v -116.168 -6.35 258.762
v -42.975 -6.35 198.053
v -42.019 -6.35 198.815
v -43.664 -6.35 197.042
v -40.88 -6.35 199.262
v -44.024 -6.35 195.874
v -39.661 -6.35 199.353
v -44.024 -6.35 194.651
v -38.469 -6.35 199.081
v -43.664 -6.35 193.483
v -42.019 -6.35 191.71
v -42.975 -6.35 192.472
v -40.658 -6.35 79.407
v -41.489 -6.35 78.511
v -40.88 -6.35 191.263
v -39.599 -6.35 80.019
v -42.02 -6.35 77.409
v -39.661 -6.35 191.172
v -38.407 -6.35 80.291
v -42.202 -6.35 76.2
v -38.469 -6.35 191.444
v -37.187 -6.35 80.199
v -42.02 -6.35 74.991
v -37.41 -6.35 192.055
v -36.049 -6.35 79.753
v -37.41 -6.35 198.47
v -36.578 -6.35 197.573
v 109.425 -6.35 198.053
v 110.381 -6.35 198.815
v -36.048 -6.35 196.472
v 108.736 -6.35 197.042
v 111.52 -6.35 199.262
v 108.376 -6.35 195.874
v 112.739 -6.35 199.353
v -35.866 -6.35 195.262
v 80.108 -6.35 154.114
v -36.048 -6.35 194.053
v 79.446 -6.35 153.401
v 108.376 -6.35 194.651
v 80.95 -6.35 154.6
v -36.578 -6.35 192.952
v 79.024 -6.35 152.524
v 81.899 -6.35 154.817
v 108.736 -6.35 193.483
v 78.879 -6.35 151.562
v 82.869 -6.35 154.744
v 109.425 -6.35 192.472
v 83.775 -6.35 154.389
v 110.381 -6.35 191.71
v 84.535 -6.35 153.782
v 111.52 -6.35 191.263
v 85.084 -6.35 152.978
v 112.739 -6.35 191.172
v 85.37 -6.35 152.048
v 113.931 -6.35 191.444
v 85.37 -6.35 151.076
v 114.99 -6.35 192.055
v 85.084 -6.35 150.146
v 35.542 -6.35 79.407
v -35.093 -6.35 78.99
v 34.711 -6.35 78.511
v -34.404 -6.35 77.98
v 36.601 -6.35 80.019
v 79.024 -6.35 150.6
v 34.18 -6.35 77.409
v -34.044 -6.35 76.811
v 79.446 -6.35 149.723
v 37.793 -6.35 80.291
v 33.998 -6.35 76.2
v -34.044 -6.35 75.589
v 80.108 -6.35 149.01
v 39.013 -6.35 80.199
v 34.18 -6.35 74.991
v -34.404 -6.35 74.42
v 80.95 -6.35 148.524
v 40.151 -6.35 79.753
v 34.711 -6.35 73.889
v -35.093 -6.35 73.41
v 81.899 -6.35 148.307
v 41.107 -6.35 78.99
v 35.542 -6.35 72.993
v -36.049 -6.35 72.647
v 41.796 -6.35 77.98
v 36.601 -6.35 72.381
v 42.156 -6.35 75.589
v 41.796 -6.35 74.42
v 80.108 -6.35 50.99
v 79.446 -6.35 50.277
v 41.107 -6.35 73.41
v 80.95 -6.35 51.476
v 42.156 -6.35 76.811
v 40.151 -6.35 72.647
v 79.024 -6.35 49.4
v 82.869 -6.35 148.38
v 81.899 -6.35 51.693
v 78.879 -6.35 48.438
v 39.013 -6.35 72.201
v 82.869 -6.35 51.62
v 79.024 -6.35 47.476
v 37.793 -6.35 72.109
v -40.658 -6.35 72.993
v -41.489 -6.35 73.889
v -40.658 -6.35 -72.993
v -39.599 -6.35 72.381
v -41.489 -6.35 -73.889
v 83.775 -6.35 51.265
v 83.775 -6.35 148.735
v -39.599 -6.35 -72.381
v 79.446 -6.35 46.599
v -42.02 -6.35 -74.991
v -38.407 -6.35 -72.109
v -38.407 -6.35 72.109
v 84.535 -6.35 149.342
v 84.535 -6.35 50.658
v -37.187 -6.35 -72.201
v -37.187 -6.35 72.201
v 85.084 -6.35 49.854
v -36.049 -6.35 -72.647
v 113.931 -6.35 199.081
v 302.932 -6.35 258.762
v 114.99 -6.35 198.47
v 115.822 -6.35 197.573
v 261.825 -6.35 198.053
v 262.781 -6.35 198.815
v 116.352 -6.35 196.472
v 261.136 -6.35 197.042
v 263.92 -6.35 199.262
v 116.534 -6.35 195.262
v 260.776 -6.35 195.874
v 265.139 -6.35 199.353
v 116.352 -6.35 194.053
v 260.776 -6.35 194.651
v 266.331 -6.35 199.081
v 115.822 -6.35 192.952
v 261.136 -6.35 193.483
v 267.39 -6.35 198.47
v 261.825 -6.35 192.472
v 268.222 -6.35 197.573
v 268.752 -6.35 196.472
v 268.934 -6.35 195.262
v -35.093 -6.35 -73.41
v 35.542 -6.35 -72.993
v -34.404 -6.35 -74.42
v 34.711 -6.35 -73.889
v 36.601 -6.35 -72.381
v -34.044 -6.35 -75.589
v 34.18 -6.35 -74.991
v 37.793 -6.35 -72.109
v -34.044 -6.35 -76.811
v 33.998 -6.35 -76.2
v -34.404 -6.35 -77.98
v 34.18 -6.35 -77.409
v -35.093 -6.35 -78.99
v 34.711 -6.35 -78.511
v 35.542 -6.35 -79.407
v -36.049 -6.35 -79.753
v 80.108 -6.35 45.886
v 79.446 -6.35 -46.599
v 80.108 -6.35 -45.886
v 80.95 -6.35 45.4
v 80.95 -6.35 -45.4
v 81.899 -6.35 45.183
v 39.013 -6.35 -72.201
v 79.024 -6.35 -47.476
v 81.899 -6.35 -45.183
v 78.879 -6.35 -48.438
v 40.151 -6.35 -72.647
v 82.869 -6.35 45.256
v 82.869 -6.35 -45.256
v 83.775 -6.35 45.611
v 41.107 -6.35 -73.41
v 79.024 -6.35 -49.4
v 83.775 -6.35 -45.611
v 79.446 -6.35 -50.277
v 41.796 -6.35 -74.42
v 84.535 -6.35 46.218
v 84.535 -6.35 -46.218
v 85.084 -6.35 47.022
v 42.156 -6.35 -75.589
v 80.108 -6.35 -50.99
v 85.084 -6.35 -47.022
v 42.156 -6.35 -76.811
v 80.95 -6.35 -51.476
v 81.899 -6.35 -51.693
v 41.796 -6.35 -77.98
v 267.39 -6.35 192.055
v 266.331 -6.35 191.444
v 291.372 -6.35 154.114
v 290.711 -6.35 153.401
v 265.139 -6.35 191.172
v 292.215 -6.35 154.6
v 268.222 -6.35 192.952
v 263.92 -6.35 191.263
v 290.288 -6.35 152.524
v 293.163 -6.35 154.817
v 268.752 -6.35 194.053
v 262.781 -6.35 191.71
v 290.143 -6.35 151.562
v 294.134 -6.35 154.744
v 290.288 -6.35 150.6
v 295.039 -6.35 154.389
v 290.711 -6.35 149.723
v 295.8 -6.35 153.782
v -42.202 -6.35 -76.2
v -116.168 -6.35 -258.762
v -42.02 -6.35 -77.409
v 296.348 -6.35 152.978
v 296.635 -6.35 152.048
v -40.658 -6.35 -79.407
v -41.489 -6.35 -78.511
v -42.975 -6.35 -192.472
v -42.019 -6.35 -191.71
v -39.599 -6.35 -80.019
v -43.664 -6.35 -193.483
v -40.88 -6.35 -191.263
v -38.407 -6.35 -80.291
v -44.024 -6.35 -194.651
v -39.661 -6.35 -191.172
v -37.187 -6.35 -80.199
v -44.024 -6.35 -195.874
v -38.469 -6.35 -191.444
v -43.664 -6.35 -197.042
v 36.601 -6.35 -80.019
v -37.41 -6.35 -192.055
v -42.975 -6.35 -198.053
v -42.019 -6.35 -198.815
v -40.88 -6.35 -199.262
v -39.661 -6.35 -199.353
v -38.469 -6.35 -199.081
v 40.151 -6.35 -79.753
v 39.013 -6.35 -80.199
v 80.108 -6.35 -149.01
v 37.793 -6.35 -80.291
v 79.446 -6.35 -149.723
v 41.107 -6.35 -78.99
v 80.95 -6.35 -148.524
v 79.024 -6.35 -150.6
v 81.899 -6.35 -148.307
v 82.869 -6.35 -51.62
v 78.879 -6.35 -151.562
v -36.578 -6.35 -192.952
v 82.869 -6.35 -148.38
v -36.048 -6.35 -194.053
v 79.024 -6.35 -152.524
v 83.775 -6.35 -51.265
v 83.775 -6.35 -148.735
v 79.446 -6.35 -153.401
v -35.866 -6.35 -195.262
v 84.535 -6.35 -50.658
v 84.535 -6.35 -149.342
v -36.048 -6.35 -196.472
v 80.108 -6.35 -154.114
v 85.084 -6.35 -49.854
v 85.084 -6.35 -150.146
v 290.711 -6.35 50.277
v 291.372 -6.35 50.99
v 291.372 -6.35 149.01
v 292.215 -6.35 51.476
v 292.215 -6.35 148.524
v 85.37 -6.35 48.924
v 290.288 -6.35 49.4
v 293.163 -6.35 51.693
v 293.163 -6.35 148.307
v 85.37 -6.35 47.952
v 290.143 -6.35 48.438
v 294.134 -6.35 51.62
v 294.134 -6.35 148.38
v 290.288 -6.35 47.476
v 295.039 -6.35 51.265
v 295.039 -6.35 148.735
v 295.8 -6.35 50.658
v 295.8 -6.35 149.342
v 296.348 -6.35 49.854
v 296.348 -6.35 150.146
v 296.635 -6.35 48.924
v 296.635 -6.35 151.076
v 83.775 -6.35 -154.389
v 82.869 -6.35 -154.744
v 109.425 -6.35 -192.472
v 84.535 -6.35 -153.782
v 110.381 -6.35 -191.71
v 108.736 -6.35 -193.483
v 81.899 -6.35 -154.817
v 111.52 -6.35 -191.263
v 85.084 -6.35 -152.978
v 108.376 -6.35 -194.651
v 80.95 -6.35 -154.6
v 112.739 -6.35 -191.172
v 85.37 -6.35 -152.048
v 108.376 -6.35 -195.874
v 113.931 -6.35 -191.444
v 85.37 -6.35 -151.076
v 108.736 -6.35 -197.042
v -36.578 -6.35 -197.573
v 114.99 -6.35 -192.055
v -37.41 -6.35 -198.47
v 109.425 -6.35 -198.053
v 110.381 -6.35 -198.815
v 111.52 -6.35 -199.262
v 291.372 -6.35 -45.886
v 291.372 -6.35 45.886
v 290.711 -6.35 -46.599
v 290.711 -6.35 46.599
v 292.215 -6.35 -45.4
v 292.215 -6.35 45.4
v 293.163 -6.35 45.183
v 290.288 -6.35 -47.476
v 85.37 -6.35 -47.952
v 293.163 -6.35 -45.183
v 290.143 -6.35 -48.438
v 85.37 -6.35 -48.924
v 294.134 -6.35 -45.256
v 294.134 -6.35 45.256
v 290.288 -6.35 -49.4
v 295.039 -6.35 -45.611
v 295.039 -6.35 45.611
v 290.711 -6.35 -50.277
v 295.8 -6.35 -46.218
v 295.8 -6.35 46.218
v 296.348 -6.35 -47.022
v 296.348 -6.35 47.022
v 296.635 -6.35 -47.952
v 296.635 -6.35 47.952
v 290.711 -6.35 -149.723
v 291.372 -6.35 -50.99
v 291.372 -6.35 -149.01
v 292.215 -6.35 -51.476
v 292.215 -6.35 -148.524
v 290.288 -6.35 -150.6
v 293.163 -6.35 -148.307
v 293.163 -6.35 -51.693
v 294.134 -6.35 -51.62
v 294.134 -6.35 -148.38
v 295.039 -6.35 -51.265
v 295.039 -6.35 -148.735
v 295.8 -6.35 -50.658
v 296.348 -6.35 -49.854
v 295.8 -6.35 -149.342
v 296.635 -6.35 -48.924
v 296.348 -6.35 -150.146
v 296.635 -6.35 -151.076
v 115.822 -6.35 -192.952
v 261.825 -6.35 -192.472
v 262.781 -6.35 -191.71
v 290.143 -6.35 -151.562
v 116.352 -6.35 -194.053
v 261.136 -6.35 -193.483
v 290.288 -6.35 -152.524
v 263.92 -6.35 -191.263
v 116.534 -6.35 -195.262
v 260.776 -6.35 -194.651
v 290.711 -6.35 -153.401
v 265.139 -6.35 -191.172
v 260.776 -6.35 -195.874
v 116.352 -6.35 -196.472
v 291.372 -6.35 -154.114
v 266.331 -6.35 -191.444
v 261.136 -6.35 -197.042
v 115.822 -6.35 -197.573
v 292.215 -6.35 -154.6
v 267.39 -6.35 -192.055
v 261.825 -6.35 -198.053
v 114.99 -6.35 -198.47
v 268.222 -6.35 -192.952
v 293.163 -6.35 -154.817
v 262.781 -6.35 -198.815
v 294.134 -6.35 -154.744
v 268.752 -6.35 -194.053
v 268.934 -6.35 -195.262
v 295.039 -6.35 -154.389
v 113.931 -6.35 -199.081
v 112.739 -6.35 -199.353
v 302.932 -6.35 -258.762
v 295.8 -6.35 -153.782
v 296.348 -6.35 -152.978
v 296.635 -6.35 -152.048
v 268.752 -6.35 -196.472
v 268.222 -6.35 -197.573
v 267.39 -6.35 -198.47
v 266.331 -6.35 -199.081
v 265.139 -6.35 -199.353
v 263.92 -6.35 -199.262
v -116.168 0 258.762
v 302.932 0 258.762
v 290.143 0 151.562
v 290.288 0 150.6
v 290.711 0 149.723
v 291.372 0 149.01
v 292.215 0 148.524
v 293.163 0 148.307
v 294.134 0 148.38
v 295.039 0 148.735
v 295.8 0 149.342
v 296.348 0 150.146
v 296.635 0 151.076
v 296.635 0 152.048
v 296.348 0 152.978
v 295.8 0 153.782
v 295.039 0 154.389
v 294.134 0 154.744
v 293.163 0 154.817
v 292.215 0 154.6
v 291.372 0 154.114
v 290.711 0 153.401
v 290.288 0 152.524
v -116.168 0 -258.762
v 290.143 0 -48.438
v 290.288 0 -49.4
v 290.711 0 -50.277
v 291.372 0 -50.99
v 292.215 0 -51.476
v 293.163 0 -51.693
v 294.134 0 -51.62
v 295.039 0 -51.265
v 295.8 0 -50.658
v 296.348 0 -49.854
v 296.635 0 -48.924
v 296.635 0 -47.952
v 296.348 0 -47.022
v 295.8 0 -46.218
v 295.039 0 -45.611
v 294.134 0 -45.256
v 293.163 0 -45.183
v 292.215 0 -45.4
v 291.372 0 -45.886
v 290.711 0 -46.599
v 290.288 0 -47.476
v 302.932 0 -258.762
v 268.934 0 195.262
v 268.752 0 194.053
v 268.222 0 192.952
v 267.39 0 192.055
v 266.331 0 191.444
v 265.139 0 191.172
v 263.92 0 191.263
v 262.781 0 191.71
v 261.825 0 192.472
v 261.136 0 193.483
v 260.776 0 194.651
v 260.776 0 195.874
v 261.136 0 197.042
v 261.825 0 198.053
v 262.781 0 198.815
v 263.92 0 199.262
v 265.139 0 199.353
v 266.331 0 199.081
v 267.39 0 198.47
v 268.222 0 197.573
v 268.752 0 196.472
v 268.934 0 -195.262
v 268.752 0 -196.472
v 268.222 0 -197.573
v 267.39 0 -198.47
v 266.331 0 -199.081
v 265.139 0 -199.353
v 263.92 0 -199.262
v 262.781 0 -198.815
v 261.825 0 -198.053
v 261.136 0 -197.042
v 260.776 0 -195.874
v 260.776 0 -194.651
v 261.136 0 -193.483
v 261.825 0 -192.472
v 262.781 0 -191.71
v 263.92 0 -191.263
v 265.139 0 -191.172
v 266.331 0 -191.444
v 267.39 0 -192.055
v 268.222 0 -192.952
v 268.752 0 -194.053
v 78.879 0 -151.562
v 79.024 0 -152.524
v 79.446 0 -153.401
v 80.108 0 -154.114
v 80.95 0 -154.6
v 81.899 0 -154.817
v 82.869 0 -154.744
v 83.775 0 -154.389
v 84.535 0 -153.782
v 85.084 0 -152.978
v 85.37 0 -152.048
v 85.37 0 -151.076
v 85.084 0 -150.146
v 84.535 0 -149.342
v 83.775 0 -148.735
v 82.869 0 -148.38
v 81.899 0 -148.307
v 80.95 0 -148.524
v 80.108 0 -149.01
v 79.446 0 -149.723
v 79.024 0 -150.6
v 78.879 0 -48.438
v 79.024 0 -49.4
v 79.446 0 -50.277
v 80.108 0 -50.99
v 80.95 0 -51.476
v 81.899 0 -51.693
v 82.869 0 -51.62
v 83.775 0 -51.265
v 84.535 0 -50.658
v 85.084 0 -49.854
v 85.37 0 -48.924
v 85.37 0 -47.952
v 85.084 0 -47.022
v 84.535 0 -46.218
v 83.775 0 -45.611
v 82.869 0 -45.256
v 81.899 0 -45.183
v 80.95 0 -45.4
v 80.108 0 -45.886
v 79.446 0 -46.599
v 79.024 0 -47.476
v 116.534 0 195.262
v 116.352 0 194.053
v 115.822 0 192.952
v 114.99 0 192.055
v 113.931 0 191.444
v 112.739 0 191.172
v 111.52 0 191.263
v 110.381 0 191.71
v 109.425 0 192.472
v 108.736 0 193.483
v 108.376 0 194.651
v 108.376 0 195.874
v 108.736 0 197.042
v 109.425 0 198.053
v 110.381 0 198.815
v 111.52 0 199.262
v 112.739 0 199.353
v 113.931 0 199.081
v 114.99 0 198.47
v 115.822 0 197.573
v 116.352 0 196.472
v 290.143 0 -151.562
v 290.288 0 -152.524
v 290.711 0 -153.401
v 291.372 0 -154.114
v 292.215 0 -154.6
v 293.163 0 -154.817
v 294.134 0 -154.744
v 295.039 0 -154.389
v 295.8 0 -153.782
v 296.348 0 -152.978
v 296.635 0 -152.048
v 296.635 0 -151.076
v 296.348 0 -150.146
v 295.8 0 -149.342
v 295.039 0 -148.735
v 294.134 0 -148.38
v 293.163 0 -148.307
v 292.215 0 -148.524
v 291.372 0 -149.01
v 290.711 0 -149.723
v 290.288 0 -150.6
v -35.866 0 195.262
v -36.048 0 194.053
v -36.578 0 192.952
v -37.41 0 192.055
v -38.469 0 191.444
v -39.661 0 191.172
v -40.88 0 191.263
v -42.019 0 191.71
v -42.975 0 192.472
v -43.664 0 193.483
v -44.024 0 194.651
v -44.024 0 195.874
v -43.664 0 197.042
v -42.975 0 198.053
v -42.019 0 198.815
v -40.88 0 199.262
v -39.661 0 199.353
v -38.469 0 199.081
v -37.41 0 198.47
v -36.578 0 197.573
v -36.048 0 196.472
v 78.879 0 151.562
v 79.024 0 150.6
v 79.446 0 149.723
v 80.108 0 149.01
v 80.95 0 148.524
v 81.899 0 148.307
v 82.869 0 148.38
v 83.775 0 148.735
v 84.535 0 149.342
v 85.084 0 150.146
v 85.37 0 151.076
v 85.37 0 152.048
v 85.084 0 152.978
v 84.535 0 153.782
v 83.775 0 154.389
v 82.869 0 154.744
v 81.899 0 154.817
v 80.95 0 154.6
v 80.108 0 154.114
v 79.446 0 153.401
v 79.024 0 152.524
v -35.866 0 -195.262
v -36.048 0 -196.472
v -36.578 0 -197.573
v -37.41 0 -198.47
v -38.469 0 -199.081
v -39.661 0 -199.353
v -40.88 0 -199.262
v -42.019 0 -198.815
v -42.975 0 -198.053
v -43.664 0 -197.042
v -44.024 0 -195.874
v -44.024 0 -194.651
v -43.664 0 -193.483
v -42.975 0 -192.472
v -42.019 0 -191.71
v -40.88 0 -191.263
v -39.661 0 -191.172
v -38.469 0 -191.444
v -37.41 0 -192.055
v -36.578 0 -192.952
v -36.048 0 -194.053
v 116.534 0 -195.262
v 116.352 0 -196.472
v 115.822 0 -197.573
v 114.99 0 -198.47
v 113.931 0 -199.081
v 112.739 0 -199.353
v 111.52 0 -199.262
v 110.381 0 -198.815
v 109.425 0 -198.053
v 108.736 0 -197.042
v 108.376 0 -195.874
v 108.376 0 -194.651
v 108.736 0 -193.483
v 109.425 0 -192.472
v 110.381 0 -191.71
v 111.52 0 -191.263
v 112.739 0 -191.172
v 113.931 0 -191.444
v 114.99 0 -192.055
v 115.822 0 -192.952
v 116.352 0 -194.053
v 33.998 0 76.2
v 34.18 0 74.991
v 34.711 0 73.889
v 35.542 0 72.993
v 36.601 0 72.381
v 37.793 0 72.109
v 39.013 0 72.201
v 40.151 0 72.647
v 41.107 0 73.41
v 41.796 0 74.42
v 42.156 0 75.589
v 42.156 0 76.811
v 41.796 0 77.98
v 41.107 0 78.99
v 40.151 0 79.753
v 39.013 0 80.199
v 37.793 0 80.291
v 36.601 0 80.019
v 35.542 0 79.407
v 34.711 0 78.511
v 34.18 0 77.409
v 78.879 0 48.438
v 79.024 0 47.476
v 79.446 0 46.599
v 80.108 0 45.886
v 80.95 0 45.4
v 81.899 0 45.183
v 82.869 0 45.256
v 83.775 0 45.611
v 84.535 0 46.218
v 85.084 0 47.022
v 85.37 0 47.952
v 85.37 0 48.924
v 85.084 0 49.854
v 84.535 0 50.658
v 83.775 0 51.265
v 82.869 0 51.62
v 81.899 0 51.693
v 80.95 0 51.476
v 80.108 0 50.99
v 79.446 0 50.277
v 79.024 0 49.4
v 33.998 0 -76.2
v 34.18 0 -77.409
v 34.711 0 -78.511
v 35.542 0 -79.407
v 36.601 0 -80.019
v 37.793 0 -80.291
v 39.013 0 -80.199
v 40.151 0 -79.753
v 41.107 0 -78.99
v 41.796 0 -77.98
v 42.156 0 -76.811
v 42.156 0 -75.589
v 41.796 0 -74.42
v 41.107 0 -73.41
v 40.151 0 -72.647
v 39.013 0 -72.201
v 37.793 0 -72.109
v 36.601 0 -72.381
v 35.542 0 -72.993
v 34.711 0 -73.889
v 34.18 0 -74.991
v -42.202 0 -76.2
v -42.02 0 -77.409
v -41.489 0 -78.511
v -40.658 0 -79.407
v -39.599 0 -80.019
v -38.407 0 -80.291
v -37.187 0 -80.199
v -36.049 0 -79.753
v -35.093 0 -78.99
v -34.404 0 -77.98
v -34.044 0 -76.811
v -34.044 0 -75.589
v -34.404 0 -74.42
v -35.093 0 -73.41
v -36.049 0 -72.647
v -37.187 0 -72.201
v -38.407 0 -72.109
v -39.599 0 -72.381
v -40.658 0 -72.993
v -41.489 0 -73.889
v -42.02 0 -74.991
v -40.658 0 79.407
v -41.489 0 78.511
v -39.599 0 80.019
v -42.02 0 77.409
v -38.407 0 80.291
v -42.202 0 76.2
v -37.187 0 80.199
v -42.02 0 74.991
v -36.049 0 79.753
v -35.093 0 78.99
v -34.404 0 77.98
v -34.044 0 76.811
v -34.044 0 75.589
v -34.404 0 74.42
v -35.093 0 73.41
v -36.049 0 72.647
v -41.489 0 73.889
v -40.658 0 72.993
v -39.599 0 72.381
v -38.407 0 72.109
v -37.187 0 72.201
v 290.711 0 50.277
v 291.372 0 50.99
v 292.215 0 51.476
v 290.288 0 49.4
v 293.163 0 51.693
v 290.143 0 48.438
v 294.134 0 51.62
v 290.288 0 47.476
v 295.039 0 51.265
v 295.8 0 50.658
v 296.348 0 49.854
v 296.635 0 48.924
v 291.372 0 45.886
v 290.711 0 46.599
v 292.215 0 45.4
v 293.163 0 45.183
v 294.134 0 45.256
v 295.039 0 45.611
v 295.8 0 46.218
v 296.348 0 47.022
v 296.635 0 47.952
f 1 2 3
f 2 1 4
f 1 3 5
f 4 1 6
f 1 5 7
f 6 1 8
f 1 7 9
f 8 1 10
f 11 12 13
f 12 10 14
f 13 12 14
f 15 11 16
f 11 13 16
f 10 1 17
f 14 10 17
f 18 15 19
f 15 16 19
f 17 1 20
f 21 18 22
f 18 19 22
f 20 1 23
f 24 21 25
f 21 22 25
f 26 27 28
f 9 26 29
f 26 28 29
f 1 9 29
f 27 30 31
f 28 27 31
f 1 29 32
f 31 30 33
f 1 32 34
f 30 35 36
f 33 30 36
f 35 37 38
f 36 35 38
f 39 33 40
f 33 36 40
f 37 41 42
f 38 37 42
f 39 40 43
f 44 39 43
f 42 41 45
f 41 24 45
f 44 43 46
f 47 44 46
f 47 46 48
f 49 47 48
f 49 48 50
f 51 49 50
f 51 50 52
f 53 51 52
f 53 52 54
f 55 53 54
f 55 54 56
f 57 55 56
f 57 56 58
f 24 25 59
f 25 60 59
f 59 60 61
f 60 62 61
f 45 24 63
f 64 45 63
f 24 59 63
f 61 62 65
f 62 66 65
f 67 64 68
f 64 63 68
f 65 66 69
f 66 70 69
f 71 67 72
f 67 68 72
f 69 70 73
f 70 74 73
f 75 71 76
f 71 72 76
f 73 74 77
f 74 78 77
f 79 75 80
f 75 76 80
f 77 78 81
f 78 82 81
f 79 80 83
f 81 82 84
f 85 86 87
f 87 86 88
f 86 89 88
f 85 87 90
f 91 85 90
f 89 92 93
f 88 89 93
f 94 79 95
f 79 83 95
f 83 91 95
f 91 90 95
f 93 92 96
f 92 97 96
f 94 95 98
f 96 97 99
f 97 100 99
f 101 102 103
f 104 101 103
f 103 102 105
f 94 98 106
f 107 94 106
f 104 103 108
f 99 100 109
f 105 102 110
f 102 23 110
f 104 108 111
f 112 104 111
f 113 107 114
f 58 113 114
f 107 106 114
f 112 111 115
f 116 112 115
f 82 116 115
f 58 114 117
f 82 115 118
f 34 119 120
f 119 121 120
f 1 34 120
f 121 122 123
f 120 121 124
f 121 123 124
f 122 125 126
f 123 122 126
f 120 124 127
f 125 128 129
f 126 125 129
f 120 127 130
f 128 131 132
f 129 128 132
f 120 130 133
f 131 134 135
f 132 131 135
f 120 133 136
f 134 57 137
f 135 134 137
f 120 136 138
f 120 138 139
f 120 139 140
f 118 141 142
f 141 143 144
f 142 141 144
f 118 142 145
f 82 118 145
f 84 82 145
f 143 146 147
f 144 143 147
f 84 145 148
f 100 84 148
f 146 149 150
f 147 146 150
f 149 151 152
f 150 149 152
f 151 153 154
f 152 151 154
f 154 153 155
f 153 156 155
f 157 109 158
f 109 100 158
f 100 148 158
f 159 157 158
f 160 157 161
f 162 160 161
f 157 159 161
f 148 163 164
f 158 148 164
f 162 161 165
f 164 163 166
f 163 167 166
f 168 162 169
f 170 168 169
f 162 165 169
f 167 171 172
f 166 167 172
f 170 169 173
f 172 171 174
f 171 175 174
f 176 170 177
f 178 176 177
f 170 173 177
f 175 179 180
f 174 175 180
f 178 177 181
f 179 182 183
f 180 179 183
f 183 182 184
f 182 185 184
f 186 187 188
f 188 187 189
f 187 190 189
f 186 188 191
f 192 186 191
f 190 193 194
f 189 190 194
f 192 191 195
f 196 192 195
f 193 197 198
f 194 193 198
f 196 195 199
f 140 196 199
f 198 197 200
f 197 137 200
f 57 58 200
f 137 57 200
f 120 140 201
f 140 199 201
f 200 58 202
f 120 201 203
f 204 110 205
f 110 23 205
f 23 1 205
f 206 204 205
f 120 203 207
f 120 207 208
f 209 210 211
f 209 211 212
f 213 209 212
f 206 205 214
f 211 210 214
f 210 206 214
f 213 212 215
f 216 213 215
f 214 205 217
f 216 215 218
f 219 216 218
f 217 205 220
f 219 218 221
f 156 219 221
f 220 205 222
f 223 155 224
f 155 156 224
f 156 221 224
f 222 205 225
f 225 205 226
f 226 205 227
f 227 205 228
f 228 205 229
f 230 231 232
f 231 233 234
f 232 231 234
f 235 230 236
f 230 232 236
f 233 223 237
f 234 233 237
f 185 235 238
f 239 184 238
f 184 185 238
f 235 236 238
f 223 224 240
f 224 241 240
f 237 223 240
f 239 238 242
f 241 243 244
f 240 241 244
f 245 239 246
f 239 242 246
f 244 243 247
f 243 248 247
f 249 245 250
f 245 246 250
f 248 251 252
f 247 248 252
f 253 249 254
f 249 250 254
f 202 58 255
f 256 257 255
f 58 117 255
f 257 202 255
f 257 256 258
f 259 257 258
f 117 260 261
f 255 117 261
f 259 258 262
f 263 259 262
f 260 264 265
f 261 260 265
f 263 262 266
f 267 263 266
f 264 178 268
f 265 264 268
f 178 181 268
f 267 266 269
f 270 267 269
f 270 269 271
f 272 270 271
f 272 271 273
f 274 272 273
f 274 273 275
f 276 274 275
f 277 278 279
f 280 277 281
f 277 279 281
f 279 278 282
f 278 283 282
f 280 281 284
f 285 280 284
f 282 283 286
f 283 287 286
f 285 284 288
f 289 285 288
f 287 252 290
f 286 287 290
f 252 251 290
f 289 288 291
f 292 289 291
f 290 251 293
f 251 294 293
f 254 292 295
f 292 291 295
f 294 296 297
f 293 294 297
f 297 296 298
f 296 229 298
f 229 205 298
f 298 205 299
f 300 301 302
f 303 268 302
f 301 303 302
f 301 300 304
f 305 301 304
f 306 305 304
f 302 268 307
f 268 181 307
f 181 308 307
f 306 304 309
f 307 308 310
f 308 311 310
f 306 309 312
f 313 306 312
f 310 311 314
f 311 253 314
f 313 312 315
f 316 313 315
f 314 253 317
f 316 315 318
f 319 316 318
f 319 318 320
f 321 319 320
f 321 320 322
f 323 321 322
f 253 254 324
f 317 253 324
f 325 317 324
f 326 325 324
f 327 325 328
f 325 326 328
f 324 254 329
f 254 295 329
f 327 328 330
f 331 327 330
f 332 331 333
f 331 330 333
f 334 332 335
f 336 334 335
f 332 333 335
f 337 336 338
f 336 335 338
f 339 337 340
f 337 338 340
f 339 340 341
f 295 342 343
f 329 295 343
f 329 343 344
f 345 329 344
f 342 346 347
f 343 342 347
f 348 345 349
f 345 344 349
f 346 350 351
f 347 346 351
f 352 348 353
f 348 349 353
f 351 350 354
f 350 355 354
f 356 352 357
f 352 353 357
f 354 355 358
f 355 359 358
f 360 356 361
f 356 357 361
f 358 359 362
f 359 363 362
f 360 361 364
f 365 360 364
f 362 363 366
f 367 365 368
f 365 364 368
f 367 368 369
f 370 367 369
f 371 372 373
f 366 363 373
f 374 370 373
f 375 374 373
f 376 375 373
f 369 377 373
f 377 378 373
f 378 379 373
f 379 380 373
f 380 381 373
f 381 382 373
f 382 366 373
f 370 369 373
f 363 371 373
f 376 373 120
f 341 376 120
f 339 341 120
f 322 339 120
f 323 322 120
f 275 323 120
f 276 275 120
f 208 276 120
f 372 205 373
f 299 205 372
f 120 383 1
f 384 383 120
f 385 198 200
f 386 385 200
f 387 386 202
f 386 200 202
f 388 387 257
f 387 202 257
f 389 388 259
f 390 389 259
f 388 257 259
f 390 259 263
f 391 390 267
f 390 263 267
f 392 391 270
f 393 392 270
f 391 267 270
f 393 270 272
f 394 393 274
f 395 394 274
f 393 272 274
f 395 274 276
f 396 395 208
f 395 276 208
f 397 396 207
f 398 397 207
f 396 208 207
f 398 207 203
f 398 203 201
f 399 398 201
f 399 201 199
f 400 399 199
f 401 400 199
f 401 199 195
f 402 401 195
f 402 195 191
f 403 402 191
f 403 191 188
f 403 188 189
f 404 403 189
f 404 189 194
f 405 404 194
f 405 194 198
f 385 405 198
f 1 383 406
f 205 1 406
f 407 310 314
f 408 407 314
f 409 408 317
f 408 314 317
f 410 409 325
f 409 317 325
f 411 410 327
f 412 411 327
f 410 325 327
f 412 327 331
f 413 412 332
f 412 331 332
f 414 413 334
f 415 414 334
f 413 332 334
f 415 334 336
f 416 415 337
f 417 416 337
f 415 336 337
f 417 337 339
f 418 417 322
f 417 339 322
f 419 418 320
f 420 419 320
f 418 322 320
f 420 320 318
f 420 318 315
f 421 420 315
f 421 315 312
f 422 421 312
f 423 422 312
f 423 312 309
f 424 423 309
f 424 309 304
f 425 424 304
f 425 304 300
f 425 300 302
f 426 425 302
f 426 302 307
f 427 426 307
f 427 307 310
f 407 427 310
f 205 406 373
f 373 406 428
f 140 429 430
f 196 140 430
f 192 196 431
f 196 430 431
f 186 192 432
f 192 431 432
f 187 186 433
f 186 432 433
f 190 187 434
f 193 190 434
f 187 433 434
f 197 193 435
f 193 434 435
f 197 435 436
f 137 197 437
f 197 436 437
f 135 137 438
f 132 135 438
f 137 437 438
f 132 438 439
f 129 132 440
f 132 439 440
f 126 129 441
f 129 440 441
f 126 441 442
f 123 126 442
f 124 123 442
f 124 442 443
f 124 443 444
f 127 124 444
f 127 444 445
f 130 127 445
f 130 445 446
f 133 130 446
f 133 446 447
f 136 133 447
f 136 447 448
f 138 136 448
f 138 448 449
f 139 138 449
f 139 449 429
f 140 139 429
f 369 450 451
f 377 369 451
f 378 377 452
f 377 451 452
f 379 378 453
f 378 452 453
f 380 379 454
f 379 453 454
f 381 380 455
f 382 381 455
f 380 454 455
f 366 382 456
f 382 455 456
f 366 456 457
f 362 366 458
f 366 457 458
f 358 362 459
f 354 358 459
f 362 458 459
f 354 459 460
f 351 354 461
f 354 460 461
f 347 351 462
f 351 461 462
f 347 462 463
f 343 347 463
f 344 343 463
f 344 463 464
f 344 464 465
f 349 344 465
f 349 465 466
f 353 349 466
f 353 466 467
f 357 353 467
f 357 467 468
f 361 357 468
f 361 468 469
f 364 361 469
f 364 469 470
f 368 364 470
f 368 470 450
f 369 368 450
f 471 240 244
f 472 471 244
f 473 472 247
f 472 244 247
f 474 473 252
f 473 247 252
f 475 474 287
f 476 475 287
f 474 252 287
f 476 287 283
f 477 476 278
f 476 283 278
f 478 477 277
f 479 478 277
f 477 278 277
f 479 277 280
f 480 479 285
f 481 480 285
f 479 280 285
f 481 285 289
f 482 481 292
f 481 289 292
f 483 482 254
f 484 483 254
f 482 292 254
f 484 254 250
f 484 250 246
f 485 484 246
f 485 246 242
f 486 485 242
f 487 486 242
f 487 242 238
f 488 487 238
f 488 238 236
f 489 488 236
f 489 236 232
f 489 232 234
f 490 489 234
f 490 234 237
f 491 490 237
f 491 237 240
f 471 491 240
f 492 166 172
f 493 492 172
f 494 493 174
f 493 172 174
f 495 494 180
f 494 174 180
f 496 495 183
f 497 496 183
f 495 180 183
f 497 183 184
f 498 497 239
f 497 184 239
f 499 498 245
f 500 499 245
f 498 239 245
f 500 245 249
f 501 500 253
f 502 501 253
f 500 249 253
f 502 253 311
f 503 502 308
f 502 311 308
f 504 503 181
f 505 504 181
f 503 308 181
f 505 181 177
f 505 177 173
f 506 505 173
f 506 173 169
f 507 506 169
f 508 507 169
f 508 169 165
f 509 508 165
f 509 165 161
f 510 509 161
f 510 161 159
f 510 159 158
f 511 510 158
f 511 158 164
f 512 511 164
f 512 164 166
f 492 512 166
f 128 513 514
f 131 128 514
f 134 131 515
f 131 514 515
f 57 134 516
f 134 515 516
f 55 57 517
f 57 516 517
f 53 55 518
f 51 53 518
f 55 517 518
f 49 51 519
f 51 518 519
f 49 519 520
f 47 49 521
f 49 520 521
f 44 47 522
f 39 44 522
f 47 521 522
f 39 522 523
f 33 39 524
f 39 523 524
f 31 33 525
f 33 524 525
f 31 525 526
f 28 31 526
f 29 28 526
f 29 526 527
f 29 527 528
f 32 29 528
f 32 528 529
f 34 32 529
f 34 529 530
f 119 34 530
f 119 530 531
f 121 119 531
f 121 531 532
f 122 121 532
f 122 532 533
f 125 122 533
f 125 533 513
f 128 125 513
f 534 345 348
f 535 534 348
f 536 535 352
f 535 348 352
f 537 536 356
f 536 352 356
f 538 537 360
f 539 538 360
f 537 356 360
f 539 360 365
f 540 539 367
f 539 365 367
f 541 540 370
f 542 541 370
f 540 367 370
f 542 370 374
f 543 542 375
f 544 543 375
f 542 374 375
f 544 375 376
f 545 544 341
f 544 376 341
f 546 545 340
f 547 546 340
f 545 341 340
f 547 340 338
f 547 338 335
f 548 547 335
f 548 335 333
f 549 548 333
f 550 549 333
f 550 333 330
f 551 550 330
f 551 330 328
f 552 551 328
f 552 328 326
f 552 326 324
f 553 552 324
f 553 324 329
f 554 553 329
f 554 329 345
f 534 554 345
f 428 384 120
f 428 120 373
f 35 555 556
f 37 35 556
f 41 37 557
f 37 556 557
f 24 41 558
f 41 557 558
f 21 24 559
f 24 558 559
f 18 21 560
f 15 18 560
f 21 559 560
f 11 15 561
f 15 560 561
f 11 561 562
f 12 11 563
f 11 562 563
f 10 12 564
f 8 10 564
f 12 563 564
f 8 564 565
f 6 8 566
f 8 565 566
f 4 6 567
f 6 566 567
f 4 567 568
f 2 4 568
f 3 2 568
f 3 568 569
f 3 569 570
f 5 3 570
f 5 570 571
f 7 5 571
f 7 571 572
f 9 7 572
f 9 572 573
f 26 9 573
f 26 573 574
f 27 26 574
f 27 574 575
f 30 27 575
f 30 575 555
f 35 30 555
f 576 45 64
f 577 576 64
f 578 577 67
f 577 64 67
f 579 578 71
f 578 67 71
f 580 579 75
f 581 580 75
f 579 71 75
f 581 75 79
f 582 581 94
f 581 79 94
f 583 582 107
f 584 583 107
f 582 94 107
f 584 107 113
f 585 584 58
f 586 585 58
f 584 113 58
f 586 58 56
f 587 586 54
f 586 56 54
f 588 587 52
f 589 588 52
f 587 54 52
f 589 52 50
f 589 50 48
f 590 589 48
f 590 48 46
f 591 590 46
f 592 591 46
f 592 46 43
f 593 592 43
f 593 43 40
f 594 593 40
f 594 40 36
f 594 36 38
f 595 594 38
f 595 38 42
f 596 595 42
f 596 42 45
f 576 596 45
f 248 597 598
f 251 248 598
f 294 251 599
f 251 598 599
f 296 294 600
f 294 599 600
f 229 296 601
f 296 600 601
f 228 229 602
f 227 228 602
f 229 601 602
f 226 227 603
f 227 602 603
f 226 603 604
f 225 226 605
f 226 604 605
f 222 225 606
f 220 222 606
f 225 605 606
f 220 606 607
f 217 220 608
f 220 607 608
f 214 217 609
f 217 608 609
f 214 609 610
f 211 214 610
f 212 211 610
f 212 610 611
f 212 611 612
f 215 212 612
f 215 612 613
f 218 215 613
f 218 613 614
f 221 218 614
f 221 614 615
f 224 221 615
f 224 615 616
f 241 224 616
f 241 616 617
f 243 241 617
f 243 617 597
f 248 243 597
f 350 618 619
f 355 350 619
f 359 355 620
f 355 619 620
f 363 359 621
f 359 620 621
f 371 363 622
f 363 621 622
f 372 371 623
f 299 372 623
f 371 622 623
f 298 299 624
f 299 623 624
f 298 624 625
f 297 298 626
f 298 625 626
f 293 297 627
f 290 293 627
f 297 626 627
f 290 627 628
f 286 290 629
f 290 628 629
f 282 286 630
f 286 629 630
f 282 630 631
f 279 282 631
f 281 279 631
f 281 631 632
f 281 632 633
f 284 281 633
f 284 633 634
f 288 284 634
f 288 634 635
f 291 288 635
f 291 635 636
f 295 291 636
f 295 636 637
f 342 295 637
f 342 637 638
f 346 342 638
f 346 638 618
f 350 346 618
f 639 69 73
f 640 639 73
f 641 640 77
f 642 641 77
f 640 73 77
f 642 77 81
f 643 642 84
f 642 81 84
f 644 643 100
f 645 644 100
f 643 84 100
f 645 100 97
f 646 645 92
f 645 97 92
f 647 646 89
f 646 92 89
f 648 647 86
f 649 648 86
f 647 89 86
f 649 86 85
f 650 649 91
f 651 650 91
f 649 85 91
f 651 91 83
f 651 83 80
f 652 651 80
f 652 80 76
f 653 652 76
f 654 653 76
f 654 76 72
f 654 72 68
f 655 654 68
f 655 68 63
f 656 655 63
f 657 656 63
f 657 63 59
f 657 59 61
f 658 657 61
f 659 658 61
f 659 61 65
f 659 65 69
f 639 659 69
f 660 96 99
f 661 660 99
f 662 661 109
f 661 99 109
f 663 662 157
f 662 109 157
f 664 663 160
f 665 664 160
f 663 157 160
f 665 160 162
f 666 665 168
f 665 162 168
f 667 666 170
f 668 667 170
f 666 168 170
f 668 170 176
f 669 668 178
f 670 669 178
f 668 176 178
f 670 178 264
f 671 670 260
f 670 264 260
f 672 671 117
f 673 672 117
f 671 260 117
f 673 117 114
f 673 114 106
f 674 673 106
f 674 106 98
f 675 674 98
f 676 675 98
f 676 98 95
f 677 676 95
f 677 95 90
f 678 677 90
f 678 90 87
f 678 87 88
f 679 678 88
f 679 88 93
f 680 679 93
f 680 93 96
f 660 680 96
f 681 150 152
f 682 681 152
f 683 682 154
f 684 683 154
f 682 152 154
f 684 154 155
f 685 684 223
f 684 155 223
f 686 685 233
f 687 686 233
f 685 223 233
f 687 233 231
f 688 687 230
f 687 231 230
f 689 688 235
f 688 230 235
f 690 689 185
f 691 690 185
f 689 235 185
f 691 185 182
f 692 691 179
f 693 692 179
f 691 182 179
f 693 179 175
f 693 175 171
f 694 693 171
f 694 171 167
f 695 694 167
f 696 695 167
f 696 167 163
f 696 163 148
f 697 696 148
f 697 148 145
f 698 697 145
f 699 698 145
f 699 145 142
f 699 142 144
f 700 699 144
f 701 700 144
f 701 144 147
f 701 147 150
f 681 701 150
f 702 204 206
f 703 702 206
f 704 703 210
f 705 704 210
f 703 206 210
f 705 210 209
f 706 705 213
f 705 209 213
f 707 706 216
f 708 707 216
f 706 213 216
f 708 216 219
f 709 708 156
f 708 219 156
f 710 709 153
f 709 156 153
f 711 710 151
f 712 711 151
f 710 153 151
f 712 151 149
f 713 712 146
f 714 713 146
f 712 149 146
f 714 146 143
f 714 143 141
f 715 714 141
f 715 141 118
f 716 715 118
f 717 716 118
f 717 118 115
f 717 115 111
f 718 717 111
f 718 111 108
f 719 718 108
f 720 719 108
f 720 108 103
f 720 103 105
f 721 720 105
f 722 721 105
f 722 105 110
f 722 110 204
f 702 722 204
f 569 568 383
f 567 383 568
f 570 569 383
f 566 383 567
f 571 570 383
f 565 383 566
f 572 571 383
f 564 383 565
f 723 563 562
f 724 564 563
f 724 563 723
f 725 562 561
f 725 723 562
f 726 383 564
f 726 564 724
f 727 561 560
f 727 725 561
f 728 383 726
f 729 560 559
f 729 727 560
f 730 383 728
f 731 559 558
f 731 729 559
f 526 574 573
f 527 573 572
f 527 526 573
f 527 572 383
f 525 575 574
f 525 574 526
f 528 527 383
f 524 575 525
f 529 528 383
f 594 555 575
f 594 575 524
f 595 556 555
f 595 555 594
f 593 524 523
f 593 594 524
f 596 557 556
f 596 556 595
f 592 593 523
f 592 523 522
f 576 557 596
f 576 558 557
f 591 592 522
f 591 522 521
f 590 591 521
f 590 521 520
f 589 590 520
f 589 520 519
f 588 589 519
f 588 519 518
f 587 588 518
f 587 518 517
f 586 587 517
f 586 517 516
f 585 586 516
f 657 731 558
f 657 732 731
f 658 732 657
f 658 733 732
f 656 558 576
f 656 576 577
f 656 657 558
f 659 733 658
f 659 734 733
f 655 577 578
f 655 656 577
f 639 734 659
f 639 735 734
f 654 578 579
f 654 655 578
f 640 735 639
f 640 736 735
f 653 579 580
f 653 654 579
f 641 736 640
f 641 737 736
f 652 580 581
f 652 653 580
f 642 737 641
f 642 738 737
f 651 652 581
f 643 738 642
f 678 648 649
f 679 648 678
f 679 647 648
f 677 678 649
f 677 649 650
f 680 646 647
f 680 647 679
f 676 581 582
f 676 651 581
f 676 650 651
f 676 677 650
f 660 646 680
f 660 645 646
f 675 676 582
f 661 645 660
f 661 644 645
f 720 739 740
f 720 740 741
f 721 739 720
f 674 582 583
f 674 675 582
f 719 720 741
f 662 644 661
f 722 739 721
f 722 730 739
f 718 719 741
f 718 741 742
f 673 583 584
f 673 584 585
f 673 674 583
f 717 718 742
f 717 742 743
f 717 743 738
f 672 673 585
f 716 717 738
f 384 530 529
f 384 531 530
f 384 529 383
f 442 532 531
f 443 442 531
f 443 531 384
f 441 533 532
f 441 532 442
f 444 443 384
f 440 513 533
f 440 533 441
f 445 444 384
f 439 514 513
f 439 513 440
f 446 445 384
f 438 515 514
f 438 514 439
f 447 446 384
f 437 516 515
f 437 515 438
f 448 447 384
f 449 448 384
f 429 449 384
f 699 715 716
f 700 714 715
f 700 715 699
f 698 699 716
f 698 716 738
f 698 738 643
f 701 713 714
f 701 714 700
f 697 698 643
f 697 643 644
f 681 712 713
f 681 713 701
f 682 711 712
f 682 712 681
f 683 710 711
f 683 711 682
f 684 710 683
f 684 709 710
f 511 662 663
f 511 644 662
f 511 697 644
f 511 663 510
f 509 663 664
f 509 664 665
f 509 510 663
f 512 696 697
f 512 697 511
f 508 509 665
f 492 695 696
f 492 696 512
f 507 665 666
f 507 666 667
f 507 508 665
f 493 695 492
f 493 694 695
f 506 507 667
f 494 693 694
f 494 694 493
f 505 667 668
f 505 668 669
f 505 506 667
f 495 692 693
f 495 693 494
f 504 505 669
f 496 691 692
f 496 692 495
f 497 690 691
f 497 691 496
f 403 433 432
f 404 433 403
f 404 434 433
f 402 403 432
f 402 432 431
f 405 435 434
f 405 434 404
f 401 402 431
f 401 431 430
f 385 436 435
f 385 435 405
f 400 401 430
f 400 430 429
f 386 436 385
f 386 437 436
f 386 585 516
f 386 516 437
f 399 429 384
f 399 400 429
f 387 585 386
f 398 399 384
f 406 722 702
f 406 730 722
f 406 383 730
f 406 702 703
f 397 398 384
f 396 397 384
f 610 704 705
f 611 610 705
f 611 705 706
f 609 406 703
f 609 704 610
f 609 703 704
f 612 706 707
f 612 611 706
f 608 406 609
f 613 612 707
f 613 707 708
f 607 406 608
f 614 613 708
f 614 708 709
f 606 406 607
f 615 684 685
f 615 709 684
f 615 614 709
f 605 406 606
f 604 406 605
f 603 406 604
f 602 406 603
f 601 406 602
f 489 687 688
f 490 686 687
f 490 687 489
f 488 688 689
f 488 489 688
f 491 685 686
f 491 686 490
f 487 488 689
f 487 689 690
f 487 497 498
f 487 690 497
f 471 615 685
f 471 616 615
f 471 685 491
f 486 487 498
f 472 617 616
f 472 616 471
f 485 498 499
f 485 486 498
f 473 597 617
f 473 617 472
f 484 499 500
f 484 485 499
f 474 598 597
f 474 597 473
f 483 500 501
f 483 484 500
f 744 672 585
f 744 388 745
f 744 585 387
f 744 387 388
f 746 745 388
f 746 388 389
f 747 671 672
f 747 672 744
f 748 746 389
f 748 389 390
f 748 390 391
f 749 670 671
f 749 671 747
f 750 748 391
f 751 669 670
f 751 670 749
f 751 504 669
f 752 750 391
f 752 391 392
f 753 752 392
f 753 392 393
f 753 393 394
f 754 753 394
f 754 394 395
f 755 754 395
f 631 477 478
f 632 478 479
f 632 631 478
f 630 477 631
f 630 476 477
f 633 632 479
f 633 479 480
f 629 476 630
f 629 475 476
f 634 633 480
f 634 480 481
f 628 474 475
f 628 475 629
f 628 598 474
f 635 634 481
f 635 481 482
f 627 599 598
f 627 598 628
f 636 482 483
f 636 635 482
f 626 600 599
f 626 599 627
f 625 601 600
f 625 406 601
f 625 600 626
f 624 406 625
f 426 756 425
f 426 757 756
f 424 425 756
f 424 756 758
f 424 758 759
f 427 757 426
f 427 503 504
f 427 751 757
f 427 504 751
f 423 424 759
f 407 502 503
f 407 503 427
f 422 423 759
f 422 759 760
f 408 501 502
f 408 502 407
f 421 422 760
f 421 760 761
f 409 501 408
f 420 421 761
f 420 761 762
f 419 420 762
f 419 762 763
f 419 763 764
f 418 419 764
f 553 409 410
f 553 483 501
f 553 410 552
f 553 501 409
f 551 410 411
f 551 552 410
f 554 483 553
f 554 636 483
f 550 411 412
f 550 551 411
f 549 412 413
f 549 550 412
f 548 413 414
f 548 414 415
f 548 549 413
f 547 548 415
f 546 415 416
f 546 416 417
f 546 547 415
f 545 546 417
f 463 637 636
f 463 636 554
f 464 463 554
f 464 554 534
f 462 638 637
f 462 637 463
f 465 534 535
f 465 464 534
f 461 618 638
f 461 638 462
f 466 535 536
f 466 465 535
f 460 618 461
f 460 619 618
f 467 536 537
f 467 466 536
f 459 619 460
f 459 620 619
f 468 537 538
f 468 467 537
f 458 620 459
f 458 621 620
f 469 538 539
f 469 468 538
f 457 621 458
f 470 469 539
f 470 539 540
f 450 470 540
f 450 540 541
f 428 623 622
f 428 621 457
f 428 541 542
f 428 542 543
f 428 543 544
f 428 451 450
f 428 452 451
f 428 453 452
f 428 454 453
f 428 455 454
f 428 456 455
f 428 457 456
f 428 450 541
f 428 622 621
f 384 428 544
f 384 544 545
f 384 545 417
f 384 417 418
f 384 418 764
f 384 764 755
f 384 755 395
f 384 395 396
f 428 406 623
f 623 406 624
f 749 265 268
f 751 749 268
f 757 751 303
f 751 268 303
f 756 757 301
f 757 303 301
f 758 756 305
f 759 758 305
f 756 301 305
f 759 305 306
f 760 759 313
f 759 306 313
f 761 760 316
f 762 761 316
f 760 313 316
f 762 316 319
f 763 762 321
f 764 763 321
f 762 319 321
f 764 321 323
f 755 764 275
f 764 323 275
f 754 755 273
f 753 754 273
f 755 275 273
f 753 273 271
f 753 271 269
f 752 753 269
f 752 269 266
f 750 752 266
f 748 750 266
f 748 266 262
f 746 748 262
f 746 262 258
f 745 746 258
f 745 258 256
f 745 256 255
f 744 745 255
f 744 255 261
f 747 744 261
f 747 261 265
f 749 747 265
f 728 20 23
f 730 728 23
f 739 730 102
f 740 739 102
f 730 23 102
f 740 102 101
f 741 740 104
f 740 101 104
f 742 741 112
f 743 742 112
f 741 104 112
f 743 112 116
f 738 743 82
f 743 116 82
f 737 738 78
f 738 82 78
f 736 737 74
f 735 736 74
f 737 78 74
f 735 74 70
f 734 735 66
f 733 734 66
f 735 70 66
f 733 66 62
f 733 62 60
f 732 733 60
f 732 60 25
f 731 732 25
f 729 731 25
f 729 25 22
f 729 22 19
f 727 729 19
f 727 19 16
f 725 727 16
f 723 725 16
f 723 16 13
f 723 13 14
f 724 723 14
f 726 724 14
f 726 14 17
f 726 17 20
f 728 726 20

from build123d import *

# Parameters (mm, degrees)
SKETCH1_W                    = 419.1
SKETCH1_H                    = 517.525
BOSS_EXTRUDE1_DEPTH          = 6.35
F_0_257_DIAMETER_HOLE1_D     = 6.5278
F_0_257_DIAMETER_HOLE1_DEPTH = 6.35
P_0_323_DIAMETER_HOLE1_D     = 8.2042
CUT_EXTRUDE2_REACH           = 8.35
SKETCH9_R                    = 4.1021


with BuildPart() as part:
    # Sketch1 → Boss-Extrude1 (new body)
    with BuildSketch(Plane(origin=(0, 0, 0), x_dir=(1, 0, 0), z_dir=(0, 1, 0))):
        with Locations((93.382352941, 0)):
            Rectangle(SKETCH1_W, SKETCH1_H)
    extrude(amount=-BOSS_EXTRUDE1_DEPTH)

    # F (0.257) Diameter Hole1
    with Locations(Plane(origin=(0, 0, 0), x_dir=(1, 0, 0), z_dir=(0, 1, 0))):
        with Locations((82.142852941, -151.562), (293.407352941, -151.562), (82.142852941, -48.438), (293.407352941, -48.438), (293.407352941, 48.438), (82.142852941, 48.438), (82.142852941, 151.562), (293.407352941, 151.562)):
            Hole(F_0_257_DIAMETER_HOLE1_D / 2, depth=F_0_257_DIAMETER_HOLE1_DEPTH)

    # P (0.323) Diameter Hole1 (through all)
    with Locations(Plane(origin=(0, 0, 0), x_dir=(1, 0, 0), z_dir=(0, 1, 0))):
        with Locations((-38.1, -76.2), (38.1, -76.2), (38.1, 76.2), (-38.1, 76.2)):
            Hole(P_0_323_DIAMETER_HOLE1_D / 2)

    # Sketch9 → Cut-Extrude2 (cut, up to next)
    with BuildSketch(Plane(origin=(0, 0, 0), x_dir=(1, 0, 0), z_dir=(0, 1, 0)), mode=Mode.PRIVATE) as cut_extrude2_sk1:
        with Locations((264.832352941, -195.2625)):
            Circle(SKETCH9_R)
    cut_extrude2_tool1 = extrude(cut_extrude2_sk1.sketch, amount=-CUT_EXTRUDE2_REACH, mode=Mode.PRIVATE) & part.part
    add(cut_extrude2_tool1.solids().sort_by_distance((264.832353, 0, 195.2625))[0], mode=Mode.SUBTRACT)
    # Sketch9 → Cut-Extrude2 (cut, up to next)
    with BuildSketch(Plane(origin=(0, 0, 0), x_dir=(1, 0, 0), z_dir=(0, 1, 0)), mode=Mode.PRIVATE) as cut_extrude2_sk2:
        with Locations((112.432352941, -195.2625)):
            Circle(SKETCH9_R)
    cut_extrude2_tool2 = extrude(cut_extrude2_sk2.sketch, amount=-CUT_EXTRUDE2_REACH, mode=Mode.PRIVATE) & part.part
    add(cut_extrude2_tool2.solids().sort_by_distance((112.432353, 0, 195.2625))[0], mode=Mode.SUBTRACT)
    # Sketch9 → Cut-Extrude2 (cut, up to next)
    with BuildSketch(Plane(origin=(0, 0, 0), x_dir=(1, 0, 0), z_dir=(0, 1, 0)), mode=Mode.PRIVATE) as cut_extrude2_sk3:
        with Locations((-39.967647059, -195.2625)):
            Circle(SKETCH9_R)
    cut_extrude2_tool3 = extrude(cut_extrude2_sk3.sketch, amount=-CUT_EXTRUDE2_REACH, mode=Mode.PRIVATE) & part.part
    add(cut_extrude2_tool3.solids().sort_by_distance((-39.967647, 0, 195.2625))[0], mode=Mode.SUBTRACT)
    # Sketch9 → Cut-Extrude2 (cut, up to next)
    with BuildSketch(Plane(origin=(0, 0, 0), x_dir=(1, 0, 0), z_dir=(0, 1, 0)), mode=Mode.PRIVATE) as cut_extrude2_sk4:
        with Locations((112.432352941, 195.2625)):
            Circle(SKETCH9_R)
    cut_extrude2_tool4 = extrude(cut_extrude2_sk4.sketch, amount=-CUT_EXTRUDE2_REACH, mode=Mode.PRIVATE) & part.part
    add(cut_extrude2_tool4.solids().sort_by_distance((112.432353, 0, -195.2625))[0], mode=Mode.SUBTRACT)
    # Sketch9 → Cut-Extrude2 (cut, up to next)
    with BuildSketch(Plane(origin=(0, 0, 0), x_dir=(1, 0, 0), z_dir=(0, 1, 0)), mode=Mode.PRIVATE) as cut_extrude2_sk5:
        with Locations((-39.967647059, 195.2625)):
            Circle(SKETCH9_R)
    cut_extrude2_tool5 = extrude(cut_extrude2_sk5.sketch, amount=-CUT_EXTRUDE2_REACH, mode=Mode.PRIVATE) & part.part
    add(cut_extrude2_tool5.solids().sort_by_distance((-39.967647, 0, -195.2625))[0], mode=Mode.SUBTRACT)
    # Sketch9 → Cut-Extrude2 (cut, up to next)
    with BuildSketch(Plane(origin=(0, 0, 0), x_dir=(1, 0, 0), z_dir=(0, 1, 0)), mode=Mode.PRIVATE) as cut_extrude2_sk6:
        with Locations((264.832352941, 195.2625)):
            Circle(SKETCH9_R)
    cut_extrude2_tool6 = extrude(cut_extrude2_sk6.sketch, amount=-CUT_EXTRUDE2_REACH, mode=Mode.PRIVATE) & part.part
    add(cut_extrude2_tool6.solids().sort_by_distance((264.832353, 0, -195.2625))[0], mode=Mode.SUBTRACT)


solid = part.part
